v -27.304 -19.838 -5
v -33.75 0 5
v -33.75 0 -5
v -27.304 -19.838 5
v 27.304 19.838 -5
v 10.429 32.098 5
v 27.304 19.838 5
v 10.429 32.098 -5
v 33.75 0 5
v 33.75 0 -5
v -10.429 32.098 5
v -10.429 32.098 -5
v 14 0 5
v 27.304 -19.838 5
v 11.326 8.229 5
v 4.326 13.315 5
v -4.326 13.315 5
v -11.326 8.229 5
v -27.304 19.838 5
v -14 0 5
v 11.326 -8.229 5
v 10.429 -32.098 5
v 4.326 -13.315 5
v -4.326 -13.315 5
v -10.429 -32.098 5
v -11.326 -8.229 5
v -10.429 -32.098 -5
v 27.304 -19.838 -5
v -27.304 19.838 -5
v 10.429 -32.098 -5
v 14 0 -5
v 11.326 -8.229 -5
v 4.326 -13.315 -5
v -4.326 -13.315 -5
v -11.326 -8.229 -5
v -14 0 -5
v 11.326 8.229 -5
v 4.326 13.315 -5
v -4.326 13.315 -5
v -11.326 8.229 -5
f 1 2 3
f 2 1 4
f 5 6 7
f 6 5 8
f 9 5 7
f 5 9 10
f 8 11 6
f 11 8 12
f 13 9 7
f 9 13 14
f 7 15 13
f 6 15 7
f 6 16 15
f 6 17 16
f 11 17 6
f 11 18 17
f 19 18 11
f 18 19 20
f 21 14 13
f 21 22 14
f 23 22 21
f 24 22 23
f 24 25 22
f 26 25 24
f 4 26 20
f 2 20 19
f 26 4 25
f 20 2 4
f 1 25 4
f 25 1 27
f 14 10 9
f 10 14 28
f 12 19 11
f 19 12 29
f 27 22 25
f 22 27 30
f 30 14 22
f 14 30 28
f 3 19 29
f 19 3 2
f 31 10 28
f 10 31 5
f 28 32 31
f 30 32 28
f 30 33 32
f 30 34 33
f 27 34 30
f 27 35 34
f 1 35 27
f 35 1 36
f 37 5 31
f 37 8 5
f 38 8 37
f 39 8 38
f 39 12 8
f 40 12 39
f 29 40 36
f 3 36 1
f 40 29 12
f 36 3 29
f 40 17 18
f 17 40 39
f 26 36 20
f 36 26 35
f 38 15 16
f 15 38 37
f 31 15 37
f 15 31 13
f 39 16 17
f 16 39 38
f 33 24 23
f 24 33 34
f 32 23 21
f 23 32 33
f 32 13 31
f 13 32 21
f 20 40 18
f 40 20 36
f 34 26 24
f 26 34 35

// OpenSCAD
/* [Render] */
$fa=1;
$fs=0.4;
$fn=10;
$show_helpers = false;

/* [General] */
$wall_thickness = 2.5;

/* [Main Body] */
$main_radius = 35;
$joining_height = 10;
$joining_radius = $main_radius - $wall_thickness / 2;

/* [Cover] */
$hole_radius = $main_radius / 2.5;

// Parts
module cover() {
    difference() {
        cylinder(h = $joining_height, r = $joining_radius , center = true);
        cylinder(h = $joining_height + 2, r = $hole_radius , center = true);
    }
}
cover();
